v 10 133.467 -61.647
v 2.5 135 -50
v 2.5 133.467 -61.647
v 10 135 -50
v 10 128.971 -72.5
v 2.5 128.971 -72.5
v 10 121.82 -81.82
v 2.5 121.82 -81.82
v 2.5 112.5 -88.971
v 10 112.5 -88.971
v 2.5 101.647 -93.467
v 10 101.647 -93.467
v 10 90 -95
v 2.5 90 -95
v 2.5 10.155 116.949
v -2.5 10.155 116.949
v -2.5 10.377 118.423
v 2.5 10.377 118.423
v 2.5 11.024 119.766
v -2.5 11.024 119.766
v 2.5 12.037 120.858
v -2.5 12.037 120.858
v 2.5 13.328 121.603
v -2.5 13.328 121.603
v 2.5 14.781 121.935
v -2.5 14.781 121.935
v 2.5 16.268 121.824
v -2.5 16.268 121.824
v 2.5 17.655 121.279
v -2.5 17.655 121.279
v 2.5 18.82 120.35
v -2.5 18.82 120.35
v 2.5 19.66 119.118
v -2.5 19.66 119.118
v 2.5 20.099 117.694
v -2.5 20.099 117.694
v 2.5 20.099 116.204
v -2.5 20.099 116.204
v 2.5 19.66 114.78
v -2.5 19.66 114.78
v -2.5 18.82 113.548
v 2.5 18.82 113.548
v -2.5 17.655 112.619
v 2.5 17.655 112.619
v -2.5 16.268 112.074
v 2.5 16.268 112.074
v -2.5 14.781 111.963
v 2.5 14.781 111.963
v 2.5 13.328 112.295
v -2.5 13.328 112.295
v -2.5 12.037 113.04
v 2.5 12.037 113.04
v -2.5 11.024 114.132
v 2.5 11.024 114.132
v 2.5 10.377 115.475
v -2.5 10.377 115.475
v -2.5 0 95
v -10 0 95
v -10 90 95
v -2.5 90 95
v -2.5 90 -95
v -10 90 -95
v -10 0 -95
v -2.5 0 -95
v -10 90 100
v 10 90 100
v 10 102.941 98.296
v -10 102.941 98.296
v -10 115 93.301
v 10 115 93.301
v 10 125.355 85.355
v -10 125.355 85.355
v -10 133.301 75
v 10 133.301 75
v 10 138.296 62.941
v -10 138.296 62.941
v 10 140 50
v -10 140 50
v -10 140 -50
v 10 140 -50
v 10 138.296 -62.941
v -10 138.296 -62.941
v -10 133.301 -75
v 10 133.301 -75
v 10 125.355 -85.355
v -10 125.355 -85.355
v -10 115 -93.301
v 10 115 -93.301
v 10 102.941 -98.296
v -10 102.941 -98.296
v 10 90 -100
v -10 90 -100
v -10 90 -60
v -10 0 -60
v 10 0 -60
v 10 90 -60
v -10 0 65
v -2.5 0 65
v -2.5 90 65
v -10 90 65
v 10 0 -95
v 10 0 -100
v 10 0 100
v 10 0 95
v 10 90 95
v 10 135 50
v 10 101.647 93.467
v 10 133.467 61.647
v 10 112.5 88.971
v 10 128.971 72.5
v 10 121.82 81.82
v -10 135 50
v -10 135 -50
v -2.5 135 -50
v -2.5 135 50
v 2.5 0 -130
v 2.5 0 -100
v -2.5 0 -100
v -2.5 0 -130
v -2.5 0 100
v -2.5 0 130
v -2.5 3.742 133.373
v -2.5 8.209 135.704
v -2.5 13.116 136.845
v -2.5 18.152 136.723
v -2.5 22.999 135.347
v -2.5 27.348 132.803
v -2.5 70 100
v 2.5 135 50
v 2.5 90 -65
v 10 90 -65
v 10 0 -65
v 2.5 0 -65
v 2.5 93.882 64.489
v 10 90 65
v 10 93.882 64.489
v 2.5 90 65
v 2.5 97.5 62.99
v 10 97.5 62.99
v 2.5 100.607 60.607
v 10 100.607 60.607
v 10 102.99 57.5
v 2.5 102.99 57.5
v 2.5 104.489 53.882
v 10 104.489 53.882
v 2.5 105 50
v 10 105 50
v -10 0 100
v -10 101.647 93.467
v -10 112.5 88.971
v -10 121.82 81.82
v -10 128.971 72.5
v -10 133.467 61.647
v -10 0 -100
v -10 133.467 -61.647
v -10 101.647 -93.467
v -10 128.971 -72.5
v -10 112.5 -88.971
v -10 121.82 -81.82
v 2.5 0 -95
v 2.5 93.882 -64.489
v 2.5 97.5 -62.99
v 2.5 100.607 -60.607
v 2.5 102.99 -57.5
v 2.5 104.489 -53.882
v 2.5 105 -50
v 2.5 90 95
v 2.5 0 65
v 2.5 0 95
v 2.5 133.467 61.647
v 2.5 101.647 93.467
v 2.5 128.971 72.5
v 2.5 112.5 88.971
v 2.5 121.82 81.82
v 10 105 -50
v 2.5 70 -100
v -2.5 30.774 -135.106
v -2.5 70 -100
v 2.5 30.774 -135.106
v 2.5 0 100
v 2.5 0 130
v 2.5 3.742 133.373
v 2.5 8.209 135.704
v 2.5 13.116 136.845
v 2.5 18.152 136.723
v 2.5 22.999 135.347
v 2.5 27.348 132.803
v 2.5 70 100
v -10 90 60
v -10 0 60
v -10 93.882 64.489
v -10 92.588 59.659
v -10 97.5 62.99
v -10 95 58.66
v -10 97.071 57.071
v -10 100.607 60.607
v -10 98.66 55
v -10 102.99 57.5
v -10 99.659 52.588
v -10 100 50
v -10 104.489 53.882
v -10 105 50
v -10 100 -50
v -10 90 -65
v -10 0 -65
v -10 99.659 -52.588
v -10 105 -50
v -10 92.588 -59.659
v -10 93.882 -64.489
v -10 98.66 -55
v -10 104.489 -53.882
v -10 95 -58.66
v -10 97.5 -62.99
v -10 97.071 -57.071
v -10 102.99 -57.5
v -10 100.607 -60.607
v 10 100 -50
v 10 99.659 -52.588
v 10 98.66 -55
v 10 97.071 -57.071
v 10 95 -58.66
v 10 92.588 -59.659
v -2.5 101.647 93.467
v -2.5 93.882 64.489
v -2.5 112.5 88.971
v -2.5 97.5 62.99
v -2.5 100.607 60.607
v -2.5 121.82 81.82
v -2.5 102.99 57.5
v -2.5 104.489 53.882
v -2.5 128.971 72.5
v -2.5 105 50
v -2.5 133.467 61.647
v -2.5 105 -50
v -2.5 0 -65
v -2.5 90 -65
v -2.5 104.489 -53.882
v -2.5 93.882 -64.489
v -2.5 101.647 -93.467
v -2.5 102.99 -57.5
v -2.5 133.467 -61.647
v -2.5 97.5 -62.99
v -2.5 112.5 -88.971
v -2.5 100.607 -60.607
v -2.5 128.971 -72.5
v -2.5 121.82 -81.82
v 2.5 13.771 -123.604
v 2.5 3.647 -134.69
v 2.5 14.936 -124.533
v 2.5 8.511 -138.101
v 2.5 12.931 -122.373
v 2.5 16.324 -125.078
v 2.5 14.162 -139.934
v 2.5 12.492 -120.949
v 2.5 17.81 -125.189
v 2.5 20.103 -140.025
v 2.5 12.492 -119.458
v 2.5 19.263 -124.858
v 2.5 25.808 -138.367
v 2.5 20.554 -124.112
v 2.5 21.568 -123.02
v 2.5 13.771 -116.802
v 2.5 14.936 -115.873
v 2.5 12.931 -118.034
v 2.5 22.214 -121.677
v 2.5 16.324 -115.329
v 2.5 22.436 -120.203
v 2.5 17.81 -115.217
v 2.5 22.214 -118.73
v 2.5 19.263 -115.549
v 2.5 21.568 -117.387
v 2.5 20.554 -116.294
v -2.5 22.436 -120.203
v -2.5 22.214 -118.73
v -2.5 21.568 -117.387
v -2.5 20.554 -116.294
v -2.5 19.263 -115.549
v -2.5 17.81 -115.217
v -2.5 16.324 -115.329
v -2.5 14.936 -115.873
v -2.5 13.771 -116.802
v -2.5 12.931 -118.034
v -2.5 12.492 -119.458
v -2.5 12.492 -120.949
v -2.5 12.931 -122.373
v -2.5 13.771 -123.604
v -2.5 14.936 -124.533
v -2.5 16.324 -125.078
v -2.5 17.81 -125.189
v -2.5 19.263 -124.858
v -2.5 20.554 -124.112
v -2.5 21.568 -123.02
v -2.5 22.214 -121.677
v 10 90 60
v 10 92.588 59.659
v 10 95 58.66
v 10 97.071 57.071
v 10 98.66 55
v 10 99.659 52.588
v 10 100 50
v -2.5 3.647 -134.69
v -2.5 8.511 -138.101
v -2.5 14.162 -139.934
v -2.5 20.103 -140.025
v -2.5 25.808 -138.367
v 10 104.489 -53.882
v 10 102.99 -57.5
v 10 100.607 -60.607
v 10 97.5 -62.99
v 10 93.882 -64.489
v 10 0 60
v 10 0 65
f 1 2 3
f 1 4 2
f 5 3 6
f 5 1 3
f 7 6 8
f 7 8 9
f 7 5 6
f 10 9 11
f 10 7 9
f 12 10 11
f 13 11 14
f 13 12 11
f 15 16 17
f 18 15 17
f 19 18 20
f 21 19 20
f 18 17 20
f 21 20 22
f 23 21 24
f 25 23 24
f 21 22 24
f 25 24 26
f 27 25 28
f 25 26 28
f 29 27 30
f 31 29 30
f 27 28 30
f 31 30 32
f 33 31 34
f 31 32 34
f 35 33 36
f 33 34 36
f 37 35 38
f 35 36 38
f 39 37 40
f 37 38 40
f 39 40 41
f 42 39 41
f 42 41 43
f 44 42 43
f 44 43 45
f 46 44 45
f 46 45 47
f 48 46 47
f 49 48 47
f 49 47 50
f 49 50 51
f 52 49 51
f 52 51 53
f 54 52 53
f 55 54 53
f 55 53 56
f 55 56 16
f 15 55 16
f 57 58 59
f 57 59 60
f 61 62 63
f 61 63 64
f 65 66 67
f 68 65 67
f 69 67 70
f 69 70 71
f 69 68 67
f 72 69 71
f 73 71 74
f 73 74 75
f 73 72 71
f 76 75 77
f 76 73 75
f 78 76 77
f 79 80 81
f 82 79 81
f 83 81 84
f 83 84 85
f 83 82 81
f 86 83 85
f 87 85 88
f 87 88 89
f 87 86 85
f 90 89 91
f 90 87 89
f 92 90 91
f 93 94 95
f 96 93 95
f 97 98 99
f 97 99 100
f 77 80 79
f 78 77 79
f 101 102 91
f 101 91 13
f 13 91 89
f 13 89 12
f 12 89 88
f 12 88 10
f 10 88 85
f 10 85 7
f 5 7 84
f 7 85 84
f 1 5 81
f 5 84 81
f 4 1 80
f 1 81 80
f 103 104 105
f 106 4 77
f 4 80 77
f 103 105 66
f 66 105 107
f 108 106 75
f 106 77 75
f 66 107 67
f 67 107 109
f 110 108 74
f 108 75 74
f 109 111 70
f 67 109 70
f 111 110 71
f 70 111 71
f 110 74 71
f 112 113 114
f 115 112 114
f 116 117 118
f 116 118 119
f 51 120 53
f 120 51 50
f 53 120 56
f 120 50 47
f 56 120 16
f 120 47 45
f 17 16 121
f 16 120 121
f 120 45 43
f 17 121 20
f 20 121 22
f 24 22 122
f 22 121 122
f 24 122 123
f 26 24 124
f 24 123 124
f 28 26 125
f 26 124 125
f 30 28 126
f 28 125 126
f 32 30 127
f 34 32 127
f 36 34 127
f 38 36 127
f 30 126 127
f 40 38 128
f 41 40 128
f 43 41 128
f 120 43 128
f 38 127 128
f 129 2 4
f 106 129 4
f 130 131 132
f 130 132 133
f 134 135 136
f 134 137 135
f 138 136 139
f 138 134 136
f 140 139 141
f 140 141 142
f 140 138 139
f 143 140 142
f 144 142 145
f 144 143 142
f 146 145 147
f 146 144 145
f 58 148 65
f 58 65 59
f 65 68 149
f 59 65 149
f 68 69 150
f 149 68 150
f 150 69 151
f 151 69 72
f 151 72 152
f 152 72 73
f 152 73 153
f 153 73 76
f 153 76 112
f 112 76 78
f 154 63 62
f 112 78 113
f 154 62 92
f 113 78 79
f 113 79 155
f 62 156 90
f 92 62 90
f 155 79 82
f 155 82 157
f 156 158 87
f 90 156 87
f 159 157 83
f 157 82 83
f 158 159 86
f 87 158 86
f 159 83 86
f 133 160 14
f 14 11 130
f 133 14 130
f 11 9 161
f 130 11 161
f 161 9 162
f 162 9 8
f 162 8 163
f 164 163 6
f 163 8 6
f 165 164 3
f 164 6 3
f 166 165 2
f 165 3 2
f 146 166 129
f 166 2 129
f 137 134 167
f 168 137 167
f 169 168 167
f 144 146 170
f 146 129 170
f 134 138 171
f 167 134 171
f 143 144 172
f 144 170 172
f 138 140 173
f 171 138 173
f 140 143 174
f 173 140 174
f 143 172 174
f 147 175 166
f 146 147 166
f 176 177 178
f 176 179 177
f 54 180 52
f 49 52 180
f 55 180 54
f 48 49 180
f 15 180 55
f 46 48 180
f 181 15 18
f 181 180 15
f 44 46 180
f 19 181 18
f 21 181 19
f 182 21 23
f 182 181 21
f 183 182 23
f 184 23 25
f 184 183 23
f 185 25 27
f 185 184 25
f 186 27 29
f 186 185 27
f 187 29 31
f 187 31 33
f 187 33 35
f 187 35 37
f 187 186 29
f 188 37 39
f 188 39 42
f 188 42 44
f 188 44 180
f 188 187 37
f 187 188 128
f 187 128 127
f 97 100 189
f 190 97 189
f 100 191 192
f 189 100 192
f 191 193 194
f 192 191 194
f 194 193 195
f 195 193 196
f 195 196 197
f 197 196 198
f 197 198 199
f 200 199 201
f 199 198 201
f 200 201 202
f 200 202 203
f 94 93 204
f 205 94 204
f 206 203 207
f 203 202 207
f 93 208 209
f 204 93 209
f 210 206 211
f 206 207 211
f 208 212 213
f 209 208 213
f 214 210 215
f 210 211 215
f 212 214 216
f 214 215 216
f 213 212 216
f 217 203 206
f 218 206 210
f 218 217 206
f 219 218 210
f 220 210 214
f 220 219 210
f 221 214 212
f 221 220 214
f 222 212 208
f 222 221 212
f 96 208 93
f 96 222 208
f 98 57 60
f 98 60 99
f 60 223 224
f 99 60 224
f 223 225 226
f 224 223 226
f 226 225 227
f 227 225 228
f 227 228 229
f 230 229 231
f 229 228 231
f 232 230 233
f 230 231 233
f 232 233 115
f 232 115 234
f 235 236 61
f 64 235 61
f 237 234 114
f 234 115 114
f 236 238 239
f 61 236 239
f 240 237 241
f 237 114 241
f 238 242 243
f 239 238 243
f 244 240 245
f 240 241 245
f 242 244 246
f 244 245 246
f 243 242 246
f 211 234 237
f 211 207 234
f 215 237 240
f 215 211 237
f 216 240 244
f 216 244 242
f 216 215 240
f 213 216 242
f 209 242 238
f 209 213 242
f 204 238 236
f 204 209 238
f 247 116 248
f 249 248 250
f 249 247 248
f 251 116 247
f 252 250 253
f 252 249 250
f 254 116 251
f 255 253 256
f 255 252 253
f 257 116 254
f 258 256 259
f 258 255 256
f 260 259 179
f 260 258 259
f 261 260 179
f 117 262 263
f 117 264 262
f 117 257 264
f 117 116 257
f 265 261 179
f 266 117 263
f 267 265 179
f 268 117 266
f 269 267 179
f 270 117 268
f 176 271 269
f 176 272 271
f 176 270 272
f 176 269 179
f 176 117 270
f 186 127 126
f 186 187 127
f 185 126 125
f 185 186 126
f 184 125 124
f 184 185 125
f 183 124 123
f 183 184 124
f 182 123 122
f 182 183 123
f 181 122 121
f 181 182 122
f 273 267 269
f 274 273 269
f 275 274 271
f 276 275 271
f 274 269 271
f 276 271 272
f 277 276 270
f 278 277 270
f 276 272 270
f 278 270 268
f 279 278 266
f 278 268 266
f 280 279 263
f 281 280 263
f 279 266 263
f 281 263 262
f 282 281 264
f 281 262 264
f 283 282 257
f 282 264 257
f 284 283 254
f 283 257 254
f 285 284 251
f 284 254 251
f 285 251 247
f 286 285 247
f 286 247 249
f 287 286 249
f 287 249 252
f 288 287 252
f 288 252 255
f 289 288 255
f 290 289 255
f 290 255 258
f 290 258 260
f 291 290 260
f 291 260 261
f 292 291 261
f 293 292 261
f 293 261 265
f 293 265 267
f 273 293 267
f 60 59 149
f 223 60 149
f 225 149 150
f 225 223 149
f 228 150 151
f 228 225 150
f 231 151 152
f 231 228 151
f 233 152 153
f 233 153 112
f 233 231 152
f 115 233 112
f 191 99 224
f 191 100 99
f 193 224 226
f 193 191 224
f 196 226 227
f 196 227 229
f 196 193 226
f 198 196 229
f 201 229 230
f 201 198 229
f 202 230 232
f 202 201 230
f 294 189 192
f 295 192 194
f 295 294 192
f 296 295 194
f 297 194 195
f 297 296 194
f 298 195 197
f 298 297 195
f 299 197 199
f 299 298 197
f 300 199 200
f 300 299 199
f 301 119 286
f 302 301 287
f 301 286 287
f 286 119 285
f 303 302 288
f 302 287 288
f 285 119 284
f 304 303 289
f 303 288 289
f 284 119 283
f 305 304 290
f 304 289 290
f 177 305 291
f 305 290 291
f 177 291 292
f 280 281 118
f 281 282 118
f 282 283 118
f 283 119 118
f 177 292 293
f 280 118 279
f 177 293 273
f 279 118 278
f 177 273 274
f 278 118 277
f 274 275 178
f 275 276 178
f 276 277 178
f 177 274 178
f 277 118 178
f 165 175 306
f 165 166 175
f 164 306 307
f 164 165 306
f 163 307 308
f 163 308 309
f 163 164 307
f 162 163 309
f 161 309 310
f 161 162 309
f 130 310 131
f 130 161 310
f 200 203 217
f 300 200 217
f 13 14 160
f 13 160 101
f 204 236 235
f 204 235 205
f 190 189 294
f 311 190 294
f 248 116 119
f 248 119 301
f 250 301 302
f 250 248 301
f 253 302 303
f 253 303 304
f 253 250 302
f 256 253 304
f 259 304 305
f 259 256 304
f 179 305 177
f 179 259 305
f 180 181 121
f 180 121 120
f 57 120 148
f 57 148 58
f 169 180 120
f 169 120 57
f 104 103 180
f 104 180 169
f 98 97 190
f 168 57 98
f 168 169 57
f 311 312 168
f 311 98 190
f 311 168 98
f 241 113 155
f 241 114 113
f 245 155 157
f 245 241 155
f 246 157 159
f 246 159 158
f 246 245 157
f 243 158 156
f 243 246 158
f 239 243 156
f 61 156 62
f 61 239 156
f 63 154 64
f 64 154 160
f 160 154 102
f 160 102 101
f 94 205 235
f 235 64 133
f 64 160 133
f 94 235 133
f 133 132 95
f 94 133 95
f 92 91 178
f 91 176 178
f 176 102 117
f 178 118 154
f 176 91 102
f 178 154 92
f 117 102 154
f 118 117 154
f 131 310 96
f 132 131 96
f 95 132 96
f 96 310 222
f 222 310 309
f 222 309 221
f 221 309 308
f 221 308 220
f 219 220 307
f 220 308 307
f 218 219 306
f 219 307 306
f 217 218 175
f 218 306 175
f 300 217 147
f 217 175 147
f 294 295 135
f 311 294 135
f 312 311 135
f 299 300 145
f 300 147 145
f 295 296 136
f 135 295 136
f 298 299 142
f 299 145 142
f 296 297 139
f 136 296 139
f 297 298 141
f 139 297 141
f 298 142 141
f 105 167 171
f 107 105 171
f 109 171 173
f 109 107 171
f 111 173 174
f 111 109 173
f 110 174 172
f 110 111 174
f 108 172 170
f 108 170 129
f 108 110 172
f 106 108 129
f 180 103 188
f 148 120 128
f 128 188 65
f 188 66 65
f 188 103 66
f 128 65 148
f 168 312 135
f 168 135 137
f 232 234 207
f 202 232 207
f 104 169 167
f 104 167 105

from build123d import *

# Parameters (mm, degrees)
F4_DEPTH  = 2.5
F5_R      = 5
F6_DEPTH  = 25.4
F8_DEPTH  = 2.5
F9_R      = 5
F10_DEPTH = 25.4


with BuildPart() as f2:
    # F2: sweep along a path in F1
    with BuildLine(Plane.YZ) as f2_path:
        Line((0, 60), (90, 60))
        ThreePointArc((90, 60), (97.071068, 57.071068), (100, 50))
        Line((100, 50), (100, -50))
        ThreePointArc((100, -50), (97.071068, -57.071068), (90, -60))
        Line((90, -60), (0, -60))
    # F0 (on Front) → F2 (sweep)
    with BuildSketch(Plane.XZ):
        Polygon((-10, 60), (0, 60), (10, 60), (10, 65), (2.5, 65), (2.5, 95), (10, 95), (10, 100), (0, 100), (-10, 100), (-10, 95), (-2.5, 95), (-2.5, 65), (-10, 65), align=None)
    sweep(path=f2_path.line)

    # F3 (on Right) → F4 (join, symmetric)
    with BuildSketch(Plane.YZ):
        with BuildLine():
            Line((0, 130), (0, 100))
            Line((0, 100), (70, 100))
            Line((70, 100), (27.347526, 132.802719))
            ThreePointArc((27.347526, 132.802719), (13.115891, 136.844791), (0, 130))
        make_face()
    extrude(amount=F4_DEPTH, both=True)

    # F5 (on face) → F6 (cut)
    with BuildSketch(Plane(origin=(-2.5, 0, 0), x_dir=(0, -1, 0), z_dir=(-1, 0, 0))):
        with Locations((-15.154916, 116.949004)):
            Circle(F5_R)
    extrude(amount=-F6_DEPTH, mode=Mode.SUBTRACT)

    # F7 (on Right) → F8 (join, symmetric)
    with BuildSketch(Plane.YZ):
        with BuildLine():
            Line((70, -100), (0, -100))
            Line((0, -100), (0, -130))
            ThreePointArc((0, -130), (14.162499, -139.933551), (30.774234, -135.106332))
            Line((30.774234, -135.106332), (70, -100))
        make_face()
    extrude(amount=F8_DEPTH, both=True)

    # F9 (on face) → F10 (cut)
    with BuildSketch(Plane.YZ.offset(2.5)):
        with Locations((17.436313, -120.203317)):
            Circle(F9_R)
    extrude(amount=-F10_DEPTH, mode=Mode.SUBTRACT)


solid = f2.part
